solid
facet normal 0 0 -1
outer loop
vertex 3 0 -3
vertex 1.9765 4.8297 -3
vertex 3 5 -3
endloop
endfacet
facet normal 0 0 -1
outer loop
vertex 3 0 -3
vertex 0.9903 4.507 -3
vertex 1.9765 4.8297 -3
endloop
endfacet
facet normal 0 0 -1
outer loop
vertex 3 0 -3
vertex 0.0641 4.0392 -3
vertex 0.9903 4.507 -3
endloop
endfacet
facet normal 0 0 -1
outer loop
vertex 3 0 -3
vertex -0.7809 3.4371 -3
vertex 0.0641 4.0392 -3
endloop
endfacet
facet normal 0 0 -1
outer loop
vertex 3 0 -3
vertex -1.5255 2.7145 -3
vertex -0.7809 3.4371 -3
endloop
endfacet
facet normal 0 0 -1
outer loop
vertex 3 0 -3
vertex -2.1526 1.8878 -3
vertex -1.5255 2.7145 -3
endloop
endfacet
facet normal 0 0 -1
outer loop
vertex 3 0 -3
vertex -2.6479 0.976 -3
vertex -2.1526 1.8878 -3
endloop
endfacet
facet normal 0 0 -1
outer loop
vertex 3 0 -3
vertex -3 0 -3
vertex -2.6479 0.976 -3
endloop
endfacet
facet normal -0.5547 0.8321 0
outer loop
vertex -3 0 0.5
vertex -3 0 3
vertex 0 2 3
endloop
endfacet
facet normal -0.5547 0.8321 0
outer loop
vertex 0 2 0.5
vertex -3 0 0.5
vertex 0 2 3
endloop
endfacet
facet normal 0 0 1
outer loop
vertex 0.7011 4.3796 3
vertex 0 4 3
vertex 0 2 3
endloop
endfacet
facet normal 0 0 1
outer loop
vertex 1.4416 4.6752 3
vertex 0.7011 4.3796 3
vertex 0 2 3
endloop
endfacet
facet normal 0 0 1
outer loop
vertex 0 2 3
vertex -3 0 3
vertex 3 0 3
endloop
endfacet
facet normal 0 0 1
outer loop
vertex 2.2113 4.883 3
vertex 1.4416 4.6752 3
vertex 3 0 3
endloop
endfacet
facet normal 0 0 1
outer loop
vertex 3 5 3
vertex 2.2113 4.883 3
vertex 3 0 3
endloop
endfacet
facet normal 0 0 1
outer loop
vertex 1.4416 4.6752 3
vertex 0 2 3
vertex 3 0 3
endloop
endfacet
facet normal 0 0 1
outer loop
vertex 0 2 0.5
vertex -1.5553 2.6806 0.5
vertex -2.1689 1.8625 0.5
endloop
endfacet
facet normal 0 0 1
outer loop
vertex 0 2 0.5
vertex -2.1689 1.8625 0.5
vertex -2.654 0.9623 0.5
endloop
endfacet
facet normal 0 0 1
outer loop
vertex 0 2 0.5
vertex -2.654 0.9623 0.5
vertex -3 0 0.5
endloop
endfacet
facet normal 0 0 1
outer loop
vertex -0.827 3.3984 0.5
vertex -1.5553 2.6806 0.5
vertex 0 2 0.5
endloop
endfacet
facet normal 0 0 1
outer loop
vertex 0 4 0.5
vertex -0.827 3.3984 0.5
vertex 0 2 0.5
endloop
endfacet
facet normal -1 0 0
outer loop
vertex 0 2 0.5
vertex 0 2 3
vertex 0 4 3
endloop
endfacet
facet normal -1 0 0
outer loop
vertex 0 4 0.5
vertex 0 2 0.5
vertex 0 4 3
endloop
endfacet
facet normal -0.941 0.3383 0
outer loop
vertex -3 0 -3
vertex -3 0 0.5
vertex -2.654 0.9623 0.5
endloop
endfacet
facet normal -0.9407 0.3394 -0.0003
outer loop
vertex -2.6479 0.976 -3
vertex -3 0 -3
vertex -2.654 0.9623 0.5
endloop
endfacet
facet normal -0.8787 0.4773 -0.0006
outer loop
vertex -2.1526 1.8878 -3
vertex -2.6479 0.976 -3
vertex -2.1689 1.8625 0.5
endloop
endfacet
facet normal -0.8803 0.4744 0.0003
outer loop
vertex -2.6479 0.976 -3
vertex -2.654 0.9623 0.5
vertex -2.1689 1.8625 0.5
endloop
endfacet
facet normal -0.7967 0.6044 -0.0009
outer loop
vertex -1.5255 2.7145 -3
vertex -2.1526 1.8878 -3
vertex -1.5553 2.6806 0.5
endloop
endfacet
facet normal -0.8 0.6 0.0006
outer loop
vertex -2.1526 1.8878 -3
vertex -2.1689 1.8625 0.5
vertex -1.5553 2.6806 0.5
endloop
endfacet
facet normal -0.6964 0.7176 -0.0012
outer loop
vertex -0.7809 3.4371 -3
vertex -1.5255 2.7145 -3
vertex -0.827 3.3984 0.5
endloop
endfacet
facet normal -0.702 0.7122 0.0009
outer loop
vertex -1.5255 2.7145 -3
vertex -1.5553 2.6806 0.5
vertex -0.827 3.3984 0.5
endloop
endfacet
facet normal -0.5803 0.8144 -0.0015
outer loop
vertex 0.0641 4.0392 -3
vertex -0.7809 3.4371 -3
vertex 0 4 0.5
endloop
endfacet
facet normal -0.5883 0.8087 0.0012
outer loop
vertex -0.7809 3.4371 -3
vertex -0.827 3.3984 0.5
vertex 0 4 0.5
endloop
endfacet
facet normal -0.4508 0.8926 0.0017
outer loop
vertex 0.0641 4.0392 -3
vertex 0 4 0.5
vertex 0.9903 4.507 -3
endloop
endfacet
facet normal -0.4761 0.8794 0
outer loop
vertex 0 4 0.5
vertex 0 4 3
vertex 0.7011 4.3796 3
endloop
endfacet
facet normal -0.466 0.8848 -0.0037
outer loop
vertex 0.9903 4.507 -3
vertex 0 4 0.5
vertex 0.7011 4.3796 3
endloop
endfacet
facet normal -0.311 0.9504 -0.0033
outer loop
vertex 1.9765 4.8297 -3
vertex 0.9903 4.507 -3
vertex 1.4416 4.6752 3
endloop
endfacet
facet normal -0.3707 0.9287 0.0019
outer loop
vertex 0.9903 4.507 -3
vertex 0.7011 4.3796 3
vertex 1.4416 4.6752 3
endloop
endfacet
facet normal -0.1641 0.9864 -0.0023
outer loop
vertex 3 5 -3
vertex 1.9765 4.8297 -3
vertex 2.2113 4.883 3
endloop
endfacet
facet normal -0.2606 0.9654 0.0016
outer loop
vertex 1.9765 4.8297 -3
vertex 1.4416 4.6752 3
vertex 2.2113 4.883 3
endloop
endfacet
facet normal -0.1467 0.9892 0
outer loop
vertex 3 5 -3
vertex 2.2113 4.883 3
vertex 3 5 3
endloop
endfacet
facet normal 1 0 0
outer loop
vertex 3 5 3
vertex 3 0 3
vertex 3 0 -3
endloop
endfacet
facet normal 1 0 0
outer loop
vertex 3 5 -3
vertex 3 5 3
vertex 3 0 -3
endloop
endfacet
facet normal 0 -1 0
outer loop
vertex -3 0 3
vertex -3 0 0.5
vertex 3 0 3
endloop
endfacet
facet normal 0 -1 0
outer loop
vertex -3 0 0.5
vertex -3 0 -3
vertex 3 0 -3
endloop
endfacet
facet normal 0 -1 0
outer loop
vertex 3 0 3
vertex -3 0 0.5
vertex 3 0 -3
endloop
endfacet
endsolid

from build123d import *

# Parameters (mm, degrees)
SKETCH1_W           = 6
SKETCH1_H           = 6
BOSS_EXTRUDE1_DEPTH = 5
CUT_EXTRUDE10_DEPTH = 12.5
CUT_EXTRUDE11_DEPTH = 2.5


with BuildPart() as part:
    # Sketch1 → Boss-Extrude1 (new body)
    with BuildSketch(Plane(origin=(0, 0, 0), x_dir=(1, 0, 0), z_dir=(0, 1, 0))):
        Rectangle(SKETCH1_W, SKETCH1_H)
    extrude(amount=BOSS_EXTRUDE1_DEPTH)

    # Sketch11 → Cut-Extrude10 (cut)
    with BuildSketch(Plane.XY.offset(3)):
        with BuildLine():
            ThreePointArc((-3, 0), (-0.780941195, 3.437129434), (3, 5))
            Line((3, 5), (-3, 5))
            Line((-3, 5), (-3, 0))
        make_face()
    extrude(amount=-CUT_EXTRUDE10_DEPTH, mode=Mode.SUBTRACT)

    # Sketch12 → Cut-Extrude11 (cut)
    with BuildSketch(Plane.XY.offset(3)):
        with BuildLine():
            Line((0, 2), (0, 4))
            ThreePointArc((0, 4), (-1.877372905, 2.283029678), (-3, 0))
            Line((-3, 0), (0, 2))
        make_face()
    extrude(amount=-CUT_EXTRUDE11_DEPTH, mode=Mode.SUBTRACT)


solid = part.part
